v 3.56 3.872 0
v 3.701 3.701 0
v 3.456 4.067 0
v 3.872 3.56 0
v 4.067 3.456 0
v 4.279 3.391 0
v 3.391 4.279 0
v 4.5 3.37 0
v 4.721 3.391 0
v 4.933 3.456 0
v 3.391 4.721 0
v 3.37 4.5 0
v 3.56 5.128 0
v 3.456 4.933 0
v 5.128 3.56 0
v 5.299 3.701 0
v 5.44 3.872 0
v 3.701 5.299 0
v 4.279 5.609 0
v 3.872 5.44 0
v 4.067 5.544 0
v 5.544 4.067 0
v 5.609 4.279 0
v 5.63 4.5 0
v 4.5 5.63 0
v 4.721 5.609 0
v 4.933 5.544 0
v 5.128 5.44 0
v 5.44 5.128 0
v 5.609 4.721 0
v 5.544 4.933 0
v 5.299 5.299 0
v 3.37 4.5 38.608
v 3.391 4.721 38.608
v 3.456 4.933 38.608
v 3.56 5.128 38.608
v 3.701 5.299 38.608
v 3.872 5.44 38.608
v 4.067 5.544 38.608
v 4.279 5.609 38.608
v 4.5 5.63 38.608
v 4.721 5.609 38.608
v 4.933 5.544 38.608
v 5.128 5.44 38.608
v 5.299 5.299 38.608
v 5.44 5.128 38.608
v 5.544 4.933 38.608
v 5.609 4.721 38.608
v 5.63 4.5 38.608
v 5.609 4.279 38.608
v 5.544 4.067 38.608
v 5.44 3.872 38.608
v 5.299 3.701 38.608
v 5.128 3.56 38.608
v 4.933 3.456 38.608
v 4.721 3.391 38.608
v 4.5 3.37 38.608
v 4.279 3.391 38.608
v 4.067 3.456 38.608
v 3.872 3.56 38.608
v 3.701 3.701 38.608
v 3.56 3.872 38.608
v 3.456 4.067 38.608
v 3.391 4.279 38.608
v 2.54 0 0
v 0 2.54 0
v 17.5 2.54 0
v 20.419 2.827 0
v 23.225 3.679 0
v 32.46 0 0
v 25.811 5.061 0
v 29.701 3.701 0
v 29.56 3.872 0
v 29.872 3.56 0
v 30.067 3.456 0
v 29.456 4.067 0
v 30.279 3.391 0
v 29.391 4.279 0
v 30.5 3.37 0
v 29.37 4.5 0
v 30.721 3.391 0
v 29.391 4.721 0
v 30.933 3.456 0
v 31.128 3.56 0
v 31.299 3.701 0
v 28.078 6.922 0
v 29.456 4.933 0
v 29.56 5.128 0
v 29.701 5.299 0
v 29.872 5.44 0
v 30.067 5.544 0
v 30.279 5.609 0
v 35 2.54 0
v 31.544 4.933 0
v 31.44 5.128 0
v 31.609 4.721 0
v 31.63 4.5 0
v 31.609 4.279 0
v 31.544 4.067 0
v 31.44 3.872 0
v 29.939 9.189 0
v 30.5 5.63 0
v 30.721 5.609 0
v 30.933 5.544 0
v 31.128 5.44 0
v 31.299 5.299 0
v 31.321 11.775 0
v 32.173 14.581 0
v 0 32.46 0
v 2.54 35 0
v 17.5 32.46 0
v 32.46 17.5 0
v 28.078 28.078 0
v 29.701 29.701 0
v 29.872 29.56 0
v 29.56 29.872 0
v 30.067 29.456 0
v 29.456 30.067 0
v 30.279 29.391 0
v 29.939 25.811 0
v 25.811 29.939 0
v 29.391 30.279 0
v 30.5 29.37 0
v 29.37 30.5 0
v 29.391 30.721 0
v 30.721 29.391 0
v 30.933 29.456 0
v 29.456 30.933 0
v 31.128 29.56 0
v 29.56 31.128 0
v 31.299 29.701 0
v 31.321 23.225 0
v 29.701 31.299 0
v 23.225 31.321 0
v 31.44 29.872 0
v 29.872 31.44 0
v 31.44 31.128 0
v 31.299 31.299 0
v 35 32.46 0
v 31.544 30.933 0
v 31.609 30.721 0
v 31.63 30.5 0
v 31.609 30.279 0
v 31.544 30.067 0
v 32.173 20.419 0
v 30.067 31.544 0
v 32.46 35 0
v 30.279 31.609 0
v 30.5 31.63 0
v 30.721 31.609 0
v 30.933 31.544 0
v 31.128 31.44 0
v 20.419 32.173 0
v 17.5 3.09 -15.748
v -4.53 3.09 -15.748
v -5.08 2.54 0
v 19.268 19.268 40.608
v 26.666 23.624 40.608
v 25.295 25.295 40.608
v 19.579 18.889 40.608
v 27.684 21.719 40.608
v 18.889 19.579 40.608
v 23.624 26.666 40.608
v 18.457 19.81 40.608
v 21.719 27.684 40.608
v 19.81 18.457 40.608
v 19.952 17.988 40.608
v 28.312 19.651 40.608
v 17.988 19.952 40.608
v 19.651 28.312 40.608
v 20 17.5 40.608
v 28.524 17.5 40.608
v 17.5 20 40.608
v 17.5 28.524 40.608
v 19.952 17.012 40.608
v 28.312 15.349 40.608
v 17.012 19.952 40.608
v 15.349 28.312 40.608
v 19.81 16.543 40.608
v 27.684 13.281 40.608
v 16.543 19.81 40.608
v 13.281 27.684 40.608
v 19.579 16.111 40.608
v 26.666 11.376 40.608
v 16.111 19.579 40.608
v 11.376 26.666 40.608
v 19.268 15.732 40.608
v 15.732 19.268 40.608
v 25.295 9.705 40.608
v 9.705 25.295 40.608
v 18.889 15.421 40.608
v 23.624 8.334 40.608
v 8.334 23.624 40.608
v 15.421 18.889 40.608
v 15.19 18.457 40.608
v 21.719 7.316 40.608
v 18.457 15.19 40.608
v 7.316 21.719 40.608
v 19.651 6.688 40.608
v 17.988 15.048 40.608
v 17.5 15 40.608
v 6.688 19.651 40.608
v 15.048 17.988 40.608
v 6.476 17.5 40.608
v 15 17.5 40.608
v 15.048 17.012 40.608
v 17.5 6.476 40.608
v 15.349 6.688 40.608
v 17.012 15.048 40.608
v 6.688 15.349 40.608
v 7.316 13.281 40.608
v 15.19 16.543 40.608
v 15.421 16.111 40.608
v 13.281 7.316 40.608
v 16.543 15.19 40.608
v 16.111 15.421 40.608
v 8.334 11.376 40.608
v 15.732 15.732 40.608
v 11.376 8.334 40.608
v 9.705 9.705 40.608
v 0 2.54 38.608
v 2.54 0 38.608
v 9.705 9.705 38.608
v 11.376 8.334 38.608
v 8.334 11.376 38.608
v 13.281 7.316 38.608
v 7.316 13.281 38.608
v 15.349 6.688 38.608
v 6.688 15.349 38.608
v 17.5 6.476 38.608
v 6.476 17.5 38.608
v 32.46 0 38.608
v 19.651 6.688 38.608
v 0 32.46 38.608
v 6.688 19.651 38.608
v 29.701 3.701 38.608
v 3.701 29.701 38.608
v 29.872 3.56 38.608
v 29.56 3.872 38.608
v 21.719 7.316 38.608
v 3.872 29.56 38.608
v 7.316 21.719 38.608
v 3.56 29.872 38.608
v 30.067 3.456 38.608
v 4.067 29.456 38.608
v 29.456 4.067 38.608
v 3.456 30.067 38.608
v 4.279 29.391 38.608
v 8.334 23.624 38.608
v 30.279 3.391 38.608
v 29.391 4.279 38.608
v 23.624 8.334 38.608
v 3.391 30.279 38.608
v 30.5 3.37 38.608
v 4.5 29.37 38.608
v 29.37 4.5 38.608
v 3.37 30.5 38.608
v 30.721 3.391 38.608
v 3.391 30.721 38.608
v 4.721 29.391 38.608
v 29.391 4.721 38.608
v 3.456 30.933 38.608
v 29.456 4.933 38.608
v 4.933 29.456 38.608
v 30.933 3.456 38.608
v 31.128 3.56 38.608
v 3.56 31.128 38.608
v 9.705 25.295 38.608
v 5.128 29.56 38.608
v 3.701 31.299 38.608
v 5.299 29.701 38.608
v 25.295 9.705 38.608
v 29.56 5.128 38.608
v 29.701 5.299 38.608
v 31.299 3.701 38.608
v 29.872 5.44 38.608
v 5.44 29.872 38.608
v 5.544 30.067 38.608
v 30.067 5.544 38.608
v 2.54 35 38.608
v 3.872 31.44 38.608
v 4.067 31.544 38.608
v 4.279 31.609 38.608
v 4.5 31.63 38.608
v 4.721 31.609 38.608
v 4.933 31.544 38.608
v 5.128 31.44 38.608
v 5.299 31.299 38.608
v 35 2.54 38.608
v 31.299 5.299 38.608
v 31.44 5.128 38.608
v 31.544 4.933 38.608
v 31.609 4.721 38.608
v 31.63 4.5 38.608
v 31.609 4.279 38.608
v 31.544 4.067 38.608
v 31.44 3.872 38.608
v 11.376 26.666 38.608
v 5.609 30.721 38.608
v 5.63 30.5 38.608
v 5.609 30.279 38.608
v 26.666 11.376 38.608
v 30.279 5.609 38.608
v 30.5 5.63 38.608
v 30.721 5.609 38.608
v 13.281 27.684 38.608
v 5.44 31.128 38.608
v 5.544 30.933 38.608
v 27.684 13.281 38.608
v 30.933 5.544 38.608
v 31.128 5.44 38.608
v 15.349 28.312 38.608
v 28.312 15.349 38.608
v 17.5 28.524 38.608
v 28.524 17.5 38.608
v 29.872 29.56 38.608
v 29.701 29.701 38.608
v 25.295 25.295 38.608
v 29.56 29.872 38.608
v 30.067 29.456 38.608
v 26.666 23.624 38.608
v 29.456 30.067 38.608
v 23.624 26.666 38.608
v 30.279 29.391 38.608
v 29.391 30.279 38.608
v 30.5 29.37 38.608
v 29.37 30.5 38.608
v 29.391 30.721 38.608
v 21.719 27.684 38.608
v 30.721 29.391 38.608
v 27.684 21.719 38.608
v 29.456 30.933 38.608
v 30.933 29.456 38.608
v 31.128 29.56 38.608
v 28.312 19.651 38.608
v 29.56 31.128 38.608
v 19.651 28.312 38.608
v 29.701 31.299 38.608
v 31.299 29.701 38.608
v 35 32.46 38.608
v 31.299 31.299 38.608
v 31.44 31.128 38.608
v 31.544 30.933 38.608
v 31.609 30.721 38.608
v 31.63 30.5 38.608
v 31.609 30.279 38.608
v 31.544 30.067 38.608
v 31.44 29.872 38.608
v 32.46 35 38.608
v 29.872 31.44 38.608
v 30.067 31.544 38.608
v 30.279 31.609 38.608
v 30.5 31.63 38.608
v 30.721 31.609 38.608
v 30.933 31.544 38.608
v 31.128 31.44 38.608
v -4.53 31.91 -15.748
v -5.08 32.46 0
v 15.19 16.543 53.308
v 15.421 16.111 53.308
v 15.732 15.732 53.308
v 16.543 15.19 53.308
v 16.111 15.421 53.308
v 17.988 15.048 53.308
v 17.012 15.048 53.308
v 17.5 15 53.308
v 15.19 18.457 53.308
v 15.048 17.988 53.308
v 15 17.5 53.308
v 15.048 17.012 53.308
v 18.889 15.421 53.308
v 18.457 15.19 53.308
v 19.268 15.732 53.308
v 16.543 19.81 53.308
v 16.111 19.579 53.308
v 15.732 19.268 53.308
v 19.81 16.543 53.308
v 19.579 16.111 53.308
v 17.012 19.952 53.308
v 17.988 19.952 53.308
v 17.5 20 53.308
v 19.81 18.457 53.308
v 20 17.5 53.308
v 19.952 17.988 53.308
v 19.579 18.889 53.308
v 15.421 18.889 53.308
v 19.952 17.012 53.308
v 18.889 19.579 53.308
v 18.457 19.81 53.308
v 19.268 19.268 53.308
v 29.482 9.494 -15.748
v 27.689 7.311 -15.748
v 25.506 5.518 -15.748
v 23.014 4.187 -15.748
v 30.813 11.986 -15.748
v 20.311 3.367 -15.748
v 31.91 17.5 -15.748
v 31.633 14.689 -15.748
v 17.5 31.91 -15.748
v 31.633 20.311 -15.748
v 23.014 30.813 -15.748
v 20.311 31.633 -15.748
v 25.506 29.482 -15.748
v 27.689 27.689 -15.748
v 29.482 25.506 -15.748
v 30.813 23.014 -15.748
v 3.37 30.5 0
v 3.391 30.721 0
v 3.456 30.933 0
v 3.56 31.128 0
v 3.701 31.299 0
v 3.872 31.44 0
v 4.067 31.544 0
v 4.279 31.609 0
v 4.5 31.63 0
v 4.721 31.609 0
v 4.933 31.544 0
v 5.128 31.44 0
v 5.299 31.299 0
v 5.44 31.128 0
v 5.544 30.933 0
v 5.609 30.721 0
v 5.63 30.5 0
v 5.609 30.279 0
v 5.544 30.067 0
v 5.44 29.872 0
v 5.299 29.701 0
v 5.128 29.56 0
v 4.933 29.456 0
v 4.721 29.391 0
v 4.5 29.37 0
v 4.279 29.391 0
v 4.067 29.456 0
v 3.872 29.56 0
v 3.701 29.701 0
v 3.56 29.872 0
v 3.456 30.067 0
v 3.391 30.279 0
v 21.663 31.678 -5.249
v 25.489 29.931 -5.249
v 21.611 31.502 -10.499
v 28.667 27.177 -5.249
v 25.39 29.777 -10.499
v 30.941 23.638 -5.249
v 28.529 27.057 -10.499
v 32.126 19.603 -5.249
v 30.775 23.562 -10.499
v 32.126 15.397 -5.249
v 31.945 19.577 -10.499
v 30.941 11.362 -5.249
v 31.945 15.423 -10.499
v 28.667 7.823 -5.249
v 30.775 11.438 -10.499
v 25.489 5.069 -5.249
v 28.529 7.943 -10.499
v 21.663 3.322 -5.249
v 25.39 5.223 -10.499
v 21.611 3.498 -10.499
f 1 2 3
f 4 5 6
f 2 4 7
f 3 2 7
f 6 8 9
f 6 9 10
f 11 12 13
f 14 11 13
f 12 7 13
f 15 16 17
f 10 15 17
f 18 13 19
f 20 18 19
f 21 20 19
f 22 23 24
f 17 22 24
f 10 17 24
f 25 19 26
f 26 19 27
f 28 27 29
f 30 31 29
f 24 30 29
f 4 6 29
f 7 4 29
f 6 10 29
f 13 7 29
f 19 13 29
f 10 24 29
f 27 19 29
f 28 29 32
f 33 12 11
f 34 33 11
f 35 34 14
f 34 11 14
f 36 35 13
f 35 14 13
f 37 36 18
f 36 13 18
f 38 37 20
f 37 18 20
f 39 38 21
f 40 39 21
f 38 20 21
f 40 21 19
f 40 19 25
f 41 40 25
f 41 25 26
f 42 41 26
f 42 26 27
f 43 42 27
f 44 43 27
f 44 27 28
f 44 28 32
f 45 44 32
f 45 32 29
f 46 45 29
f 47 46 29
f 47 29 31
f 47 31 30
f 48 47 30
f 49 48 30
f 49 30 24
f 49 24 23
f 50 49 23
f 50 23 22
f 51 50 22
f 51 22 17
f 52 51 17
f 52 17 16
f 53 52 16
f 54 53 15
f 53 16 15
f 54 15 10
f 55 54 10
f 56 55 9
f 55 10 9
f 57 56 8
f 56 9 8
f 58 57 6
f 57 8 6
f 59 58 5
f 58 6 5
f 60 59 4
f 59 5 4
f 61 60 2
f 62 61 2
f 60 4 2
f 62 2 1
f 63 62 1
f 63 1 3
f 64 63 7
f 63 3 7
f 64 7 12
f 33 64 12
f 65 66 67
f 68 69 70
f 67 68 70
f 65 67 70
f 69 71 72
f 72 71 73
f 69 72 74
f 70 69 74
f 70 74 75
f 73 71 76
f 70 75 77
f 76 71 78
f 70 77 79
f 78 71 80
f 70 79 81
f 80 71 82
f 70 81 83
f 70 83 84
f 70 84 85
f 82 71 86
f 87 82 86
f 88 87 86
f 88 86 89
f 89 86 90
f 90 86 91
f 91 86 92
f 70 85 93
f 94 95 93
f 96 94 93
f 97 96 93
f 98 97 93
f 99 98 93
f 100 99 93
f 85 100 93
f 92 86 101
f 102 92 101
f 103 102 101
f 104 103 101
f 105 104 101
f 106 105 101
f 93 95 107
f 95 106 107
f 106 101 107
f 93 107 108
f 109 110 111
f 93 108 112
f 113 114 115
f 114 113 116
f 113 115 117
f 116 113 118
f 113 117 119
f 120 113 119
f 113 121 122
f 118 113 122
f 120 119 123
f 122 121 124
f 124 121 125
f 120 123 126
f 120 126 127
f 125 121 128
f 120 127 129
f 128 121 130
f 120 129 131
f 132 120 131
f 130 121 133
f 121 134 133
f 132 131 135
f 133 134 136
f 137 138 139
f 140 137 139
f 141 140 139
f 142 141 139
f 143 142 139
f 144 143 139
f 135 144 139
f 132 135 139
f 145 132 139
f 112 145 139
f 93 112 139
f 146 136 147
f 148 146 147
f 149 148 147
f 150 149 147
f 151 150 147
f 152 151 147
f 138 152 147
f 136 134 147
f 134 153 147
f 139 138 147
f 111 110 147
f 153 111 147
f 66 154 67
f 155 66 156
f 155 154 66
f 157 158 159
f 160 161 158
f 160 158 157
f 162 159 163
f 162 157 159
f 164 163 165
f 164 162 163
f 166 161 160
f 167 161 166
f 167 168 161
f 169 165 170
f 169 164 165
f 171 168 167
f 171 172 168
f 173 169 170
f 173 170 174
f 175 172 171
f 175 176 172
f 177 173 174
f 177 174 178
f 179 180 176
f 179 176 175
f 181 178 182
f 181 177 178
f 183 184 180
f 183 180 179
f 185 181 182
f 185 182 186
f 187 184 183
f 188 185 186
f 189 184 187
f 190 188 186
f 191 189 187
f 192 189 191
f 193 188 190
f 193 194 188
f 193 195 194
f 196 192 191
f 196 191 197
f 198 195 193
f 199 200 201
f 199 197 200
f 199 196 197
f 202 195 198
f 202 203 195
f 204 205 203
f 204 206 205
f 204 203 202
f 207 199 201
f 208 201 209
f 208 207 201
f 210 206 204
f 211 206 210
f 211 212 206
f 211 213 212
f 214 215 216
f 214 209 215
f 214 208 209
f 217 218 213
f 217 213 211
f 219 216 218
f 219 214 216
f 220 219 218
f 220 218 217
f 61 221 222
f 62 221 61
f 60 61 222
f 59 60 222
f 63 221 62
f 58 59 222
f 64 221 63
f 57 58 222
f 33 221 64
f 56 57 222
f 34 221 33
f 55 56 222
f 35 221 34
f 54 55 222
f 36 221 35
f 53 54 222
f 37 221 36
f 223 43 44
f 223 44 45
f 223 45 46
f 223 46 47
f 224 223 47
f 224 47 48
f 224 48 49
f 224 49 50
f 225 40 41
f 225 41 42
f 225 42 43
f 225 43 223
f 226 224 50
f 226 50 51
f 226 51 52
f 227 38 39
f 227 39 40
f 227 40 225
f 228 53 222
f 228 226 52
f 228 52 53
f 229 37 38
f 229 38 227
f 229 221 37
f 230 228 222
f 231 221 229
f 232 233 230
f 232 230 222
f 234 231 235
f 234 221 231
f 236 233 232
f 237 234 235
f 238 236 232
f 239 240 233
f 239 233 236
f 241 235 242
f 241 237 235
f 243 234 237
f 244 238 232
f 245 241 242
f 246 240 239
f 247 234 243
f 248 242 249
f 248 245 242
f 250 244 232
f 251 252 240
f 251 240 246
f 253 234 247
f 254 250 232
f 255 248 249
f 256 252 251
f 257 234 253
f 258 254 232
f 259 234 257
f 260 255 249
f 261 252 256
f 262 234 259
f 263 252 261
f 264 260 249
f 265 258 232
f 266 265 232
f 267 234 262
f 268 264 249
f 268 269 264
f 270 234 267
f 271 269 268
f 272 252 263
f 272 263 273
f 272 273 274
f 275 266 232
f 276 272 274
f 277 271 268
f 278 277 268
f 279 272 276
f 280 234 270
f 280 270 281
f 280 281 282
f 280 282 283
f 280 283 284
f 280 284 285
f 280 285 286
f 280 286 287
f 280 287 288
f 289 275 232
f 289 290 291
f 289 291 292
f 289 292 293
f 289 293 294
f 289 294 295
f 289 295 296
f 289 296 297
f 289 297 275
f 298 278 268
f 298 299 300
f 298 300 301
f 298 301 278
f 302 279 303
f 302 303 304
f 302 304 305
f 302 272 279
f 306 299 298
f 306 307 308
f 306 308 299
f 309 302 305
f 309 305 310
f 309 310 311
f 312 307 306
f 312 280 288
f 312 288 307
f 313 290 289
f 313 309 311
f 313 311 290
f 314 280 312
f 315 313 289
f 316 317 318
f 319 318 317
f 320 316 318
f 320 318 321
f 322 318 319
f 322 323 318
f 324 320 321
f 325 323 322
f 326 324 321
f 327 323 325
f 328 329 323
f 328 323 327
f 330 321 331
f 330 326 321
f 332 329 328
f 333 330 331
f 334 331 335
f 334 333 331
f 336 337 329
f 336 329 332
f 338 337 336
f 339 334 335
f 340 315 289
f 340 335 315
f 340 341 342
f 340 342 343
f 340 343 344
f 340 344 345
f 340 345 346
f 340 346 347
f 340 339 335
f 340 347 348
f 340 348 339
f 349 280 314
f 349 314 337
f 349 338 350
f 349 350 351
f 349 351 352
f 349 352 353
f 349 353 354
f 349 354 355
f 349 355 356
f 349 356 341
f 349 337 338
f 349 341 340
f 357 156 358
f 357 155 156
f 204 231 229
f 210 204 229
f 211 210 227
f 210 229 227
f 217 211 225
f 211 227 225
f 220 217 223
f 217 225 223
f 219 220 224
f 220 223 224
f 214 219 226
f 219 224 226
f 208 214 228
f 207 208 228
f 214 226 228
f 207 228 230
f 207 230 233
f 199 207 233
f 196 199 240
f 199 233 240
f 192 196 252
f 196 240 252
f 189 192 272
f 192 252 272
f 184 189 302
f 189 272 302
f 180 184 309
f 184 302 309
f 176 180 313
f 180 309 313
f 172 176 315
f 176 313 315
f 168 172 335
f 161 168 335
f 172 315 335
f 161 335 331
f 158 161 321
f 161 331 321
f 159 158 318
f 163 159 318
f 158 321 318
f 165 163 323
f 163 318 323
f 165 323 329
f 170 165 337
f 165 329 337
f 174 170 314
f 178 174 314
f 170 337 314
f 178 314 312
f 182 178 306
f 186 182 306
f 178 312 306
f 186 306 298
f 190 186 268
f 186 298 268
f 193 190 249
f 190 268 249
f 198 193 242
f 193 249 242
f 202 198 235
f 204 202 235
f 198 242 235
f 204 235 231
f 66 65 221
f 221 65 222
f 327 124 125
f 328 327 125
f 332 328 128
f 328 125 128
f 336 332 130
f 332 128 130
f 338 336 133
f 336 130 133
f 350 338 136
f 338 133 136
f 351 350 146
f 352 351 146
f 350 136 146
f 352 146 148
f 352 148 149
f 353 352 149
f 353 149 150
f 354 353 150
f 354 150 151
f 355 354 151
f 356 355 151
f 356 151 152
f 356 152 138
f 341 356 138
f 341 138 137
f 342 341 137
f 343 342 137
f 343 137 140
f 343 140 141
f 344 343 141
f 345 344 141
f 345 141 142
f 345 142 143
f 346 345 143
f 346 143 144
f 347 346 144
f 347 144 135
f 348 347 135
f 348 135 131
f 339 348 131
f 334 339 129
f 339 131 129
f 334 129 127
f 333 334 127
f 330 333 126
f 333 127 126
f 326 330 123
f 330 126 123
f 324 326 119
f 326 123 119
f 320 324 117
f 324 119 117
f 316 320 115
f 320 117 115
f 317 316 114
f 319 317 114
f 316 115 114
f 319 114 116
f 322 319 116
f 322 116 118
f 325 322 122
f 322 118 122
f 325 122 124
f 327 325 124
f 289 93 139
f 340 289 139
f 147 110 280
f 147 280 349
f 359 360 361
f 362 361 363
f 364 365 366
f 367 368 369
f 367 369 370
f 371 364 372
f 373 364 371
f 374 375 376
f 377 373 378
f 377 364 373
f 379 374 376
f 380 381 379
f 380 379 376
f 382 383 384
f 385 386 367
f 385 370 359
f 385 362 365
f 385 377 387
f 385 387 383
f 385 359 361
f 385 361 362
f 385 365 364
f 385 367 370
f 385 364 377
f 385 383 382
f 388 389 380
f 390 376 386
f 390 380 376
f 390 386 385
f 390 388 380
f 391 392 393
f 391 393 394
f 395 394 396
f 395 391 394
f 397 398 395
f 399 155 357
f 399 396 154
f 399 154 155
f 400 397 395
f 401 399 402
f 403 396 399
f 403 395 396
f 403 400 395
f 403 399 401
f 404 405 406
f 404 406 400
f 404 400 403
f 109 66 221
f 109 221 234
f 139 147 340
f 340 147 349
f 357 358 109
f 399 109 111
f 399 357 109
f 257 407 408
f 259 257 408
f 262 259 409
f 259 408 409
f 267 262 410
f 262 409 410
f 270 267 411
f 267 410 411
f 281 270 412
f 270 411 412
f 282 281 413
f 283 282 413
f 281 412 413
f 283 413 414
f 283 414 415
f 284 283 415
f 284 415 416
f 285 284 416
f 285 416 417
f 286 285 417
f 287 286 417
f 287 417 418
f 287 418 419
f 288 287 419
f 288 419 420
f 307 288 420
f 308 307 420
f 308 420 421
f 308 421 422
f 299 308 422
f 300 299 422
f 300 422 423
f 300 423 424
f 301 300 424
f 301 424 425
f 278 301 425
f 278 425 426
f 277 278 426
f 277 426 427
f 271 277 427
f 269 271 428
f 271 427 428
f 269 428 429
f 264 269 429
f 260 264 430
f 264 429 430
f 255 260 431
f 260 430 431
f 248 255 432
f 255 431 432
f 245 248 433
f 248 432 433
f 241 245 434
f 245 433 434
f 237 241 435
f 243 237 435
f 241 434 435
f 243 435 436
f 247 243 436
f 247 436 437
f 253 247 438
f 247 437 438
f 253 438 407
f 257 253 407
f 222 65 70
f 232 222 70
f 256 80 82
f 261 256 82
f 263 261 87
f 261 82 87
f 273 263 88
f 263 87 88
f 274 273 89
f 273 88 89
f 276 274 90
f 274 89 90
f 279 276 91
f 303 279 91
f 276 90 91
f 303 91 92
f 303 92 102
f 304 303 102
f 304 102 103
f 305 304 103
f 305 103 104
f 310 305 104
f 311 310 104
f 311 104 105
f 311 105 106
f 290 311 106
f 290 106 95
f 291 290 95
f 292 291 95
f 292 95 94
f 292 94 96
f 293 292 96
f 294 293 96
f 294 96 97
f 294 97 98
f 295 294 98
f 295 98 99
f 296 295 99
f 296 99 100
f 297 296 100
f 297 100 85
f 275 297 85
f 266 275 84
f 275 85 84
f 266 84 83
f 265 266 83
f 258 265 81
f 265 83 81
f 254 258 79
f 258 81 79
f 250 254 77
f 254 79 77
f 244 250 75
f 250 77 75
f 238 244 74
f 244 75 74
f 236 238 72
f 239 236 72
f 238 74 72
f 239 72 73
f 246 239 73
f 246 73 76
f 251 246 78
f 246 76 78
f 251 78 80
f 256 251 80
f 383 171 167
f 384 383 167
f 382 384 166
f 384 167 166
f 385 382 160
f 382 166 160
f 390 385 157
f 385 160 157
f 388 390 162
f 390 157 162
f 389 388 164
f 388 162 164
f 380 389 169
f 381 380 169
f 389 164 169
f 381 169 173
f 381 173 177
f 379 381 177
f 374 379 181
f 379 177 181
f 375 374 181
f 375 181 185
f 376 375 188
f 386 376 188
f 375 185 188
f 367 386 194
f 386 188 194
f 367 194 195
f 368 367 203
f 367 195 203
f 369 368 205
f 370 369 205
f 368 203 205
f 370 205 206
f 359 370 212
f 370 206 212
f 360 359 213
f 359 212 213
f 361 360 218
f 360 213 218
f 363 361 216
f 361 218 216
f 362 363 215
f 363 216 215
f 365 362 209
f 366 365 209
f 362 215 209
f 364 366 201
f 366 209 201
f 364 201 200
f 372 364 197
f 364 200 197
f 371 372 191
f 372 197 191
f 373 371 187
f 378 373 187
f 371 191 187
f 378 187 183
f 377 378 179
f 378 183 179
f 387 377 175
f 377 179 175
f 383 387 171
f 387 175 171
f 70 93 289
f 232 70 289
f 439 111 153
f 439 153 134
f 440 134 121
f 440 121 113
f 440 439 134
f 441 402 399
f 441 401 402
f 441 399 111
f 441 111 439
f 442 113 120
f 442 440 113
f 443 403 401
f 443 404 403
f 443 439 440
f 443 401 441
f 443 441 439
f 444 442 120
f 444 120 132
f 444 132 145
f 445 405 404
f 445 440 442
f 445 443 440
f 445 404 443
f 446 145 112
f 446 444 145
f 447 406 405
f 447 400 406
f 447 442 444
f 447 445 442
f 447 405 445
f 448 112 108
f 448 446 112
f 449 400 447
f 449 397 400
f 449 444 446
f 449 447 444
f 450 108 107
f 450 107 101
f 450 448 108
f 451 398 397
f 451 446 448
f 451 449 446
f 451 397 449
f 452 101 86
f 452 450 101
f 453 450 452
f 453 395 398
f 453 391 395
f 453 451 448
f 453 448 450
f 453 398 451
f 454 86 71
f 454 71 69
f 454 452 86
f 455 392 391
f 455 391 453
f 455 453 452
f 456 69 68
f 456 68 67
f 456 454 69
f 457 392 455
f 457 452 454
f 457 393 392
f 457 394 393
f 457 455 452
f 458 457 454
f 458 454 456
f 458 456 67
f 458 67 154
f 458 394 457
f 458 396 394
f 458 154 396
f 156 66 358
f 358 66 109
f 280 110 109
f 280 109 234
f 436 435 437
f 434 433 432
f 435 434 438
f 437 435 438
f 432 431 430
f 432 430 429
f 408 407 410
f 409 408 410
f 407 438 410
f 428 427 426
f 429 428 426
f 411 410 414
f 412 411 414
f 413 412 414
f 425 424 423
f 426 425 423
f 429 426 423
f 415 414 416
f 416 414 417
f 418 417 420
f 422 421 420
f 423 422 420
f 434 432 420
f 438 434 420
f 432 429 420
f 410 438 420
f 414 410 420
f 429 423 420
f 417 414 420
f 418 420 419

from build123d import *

# Parameters (mm, degrees)
SKETCH1_W             = 35
SKETCH1_H             = 35
BOSS_EXTRUDE1_DEPTH   = 38.608
CHAMFER1_SIZE         = 2.54
SKETCH2_R             = 11.0236
BOSS_EXTRUDE2_DEPTH   = 2
SKETCH3_R             = 2.5
BOSS_EXTRUDE3_DEPTH   = 12.7
F_4_40_TAPPED_HOLE1_D = 2.2606
BOSS_EXTRUDE4_DEPTH   = 15.748
BOSS_EXTRUDE4_TAPER   = 2


with BuildPart() as part:
    # Sketch1 → Boss-Extrude1 (new body)
    with BuildSketch(Plane.XY):
        with Locations((17.5, 17.5)):
            Rectangle(SKETCH1_W, SKETCH1_H)
    extrude(amount=BOSS_EXTRUDE1_DEPTH)

    # Chamfer1
    chamfer1_edges = [part.edges().sort_by_distance(p)[0] for p in [
        (0, 35, 19.304),
        (35, 35, 19.304),
        (35, 0, 19.304),
        (0, 0, 19.304),
    ]]
    chamfer(chamfer1_edges, length=CHAMFER1_SIZE)

    # Sketch2 → Boss-Extrude2 (add)
    with BuildSketch(Plane.XY.offset(38.608)):
        with Locations(Location((17.5, 17.5, 0), (0, 0, 180))):  # turned: the seam where the file's is
            Circle(SKETCH2_R)
    extrude(amount=BOSS_EXTRUDE2_DEPTH)

    # Sketch3 → Boss-Extrude3 (add)
    with BuildSketch(Plane.XY.offset(40.608)):
        with Locations((17.5, 17.5)):
            Circle(SKETCH3_R)
    extrude(amount=BOSS_EXTRUDE3_DEPTH)

    # #4-40 Tapped Hole1 (through all)
    with Locations(Plane.XY.offset(38.608)):
        with Locations((4.5, 30.5), (30.5, 4.5), (4.5, 4.5), (30.5, 30.5)):
            Hole(F_4_40_TAPPED_HOLE1_D / 2)

    # Sketch6 → Boss-Extrude4 (add)
    with BuildSketch(Plane(origin=(0, 0, 0), x_dir=(-1, 0, 0), z_dir=(0, 0, -1))):
        with BuildLine():
            Line((5.08, 2.54), (5.08, 32.46))
            Line((5.08, 32.46), (-17.5, 32.46))
            ThreePointArc((-17.5, 32.46), (-32.46, 17.5), (-17.5, 2.54))
            Line((-17.5, 2.54), (5.08, 2.54))
        make_face()
    extrude(amount=BOSS_EXTRUDE4_DEPTH, taper=BOSS_EXTRUDE4_TAPER)


solid = part.part
